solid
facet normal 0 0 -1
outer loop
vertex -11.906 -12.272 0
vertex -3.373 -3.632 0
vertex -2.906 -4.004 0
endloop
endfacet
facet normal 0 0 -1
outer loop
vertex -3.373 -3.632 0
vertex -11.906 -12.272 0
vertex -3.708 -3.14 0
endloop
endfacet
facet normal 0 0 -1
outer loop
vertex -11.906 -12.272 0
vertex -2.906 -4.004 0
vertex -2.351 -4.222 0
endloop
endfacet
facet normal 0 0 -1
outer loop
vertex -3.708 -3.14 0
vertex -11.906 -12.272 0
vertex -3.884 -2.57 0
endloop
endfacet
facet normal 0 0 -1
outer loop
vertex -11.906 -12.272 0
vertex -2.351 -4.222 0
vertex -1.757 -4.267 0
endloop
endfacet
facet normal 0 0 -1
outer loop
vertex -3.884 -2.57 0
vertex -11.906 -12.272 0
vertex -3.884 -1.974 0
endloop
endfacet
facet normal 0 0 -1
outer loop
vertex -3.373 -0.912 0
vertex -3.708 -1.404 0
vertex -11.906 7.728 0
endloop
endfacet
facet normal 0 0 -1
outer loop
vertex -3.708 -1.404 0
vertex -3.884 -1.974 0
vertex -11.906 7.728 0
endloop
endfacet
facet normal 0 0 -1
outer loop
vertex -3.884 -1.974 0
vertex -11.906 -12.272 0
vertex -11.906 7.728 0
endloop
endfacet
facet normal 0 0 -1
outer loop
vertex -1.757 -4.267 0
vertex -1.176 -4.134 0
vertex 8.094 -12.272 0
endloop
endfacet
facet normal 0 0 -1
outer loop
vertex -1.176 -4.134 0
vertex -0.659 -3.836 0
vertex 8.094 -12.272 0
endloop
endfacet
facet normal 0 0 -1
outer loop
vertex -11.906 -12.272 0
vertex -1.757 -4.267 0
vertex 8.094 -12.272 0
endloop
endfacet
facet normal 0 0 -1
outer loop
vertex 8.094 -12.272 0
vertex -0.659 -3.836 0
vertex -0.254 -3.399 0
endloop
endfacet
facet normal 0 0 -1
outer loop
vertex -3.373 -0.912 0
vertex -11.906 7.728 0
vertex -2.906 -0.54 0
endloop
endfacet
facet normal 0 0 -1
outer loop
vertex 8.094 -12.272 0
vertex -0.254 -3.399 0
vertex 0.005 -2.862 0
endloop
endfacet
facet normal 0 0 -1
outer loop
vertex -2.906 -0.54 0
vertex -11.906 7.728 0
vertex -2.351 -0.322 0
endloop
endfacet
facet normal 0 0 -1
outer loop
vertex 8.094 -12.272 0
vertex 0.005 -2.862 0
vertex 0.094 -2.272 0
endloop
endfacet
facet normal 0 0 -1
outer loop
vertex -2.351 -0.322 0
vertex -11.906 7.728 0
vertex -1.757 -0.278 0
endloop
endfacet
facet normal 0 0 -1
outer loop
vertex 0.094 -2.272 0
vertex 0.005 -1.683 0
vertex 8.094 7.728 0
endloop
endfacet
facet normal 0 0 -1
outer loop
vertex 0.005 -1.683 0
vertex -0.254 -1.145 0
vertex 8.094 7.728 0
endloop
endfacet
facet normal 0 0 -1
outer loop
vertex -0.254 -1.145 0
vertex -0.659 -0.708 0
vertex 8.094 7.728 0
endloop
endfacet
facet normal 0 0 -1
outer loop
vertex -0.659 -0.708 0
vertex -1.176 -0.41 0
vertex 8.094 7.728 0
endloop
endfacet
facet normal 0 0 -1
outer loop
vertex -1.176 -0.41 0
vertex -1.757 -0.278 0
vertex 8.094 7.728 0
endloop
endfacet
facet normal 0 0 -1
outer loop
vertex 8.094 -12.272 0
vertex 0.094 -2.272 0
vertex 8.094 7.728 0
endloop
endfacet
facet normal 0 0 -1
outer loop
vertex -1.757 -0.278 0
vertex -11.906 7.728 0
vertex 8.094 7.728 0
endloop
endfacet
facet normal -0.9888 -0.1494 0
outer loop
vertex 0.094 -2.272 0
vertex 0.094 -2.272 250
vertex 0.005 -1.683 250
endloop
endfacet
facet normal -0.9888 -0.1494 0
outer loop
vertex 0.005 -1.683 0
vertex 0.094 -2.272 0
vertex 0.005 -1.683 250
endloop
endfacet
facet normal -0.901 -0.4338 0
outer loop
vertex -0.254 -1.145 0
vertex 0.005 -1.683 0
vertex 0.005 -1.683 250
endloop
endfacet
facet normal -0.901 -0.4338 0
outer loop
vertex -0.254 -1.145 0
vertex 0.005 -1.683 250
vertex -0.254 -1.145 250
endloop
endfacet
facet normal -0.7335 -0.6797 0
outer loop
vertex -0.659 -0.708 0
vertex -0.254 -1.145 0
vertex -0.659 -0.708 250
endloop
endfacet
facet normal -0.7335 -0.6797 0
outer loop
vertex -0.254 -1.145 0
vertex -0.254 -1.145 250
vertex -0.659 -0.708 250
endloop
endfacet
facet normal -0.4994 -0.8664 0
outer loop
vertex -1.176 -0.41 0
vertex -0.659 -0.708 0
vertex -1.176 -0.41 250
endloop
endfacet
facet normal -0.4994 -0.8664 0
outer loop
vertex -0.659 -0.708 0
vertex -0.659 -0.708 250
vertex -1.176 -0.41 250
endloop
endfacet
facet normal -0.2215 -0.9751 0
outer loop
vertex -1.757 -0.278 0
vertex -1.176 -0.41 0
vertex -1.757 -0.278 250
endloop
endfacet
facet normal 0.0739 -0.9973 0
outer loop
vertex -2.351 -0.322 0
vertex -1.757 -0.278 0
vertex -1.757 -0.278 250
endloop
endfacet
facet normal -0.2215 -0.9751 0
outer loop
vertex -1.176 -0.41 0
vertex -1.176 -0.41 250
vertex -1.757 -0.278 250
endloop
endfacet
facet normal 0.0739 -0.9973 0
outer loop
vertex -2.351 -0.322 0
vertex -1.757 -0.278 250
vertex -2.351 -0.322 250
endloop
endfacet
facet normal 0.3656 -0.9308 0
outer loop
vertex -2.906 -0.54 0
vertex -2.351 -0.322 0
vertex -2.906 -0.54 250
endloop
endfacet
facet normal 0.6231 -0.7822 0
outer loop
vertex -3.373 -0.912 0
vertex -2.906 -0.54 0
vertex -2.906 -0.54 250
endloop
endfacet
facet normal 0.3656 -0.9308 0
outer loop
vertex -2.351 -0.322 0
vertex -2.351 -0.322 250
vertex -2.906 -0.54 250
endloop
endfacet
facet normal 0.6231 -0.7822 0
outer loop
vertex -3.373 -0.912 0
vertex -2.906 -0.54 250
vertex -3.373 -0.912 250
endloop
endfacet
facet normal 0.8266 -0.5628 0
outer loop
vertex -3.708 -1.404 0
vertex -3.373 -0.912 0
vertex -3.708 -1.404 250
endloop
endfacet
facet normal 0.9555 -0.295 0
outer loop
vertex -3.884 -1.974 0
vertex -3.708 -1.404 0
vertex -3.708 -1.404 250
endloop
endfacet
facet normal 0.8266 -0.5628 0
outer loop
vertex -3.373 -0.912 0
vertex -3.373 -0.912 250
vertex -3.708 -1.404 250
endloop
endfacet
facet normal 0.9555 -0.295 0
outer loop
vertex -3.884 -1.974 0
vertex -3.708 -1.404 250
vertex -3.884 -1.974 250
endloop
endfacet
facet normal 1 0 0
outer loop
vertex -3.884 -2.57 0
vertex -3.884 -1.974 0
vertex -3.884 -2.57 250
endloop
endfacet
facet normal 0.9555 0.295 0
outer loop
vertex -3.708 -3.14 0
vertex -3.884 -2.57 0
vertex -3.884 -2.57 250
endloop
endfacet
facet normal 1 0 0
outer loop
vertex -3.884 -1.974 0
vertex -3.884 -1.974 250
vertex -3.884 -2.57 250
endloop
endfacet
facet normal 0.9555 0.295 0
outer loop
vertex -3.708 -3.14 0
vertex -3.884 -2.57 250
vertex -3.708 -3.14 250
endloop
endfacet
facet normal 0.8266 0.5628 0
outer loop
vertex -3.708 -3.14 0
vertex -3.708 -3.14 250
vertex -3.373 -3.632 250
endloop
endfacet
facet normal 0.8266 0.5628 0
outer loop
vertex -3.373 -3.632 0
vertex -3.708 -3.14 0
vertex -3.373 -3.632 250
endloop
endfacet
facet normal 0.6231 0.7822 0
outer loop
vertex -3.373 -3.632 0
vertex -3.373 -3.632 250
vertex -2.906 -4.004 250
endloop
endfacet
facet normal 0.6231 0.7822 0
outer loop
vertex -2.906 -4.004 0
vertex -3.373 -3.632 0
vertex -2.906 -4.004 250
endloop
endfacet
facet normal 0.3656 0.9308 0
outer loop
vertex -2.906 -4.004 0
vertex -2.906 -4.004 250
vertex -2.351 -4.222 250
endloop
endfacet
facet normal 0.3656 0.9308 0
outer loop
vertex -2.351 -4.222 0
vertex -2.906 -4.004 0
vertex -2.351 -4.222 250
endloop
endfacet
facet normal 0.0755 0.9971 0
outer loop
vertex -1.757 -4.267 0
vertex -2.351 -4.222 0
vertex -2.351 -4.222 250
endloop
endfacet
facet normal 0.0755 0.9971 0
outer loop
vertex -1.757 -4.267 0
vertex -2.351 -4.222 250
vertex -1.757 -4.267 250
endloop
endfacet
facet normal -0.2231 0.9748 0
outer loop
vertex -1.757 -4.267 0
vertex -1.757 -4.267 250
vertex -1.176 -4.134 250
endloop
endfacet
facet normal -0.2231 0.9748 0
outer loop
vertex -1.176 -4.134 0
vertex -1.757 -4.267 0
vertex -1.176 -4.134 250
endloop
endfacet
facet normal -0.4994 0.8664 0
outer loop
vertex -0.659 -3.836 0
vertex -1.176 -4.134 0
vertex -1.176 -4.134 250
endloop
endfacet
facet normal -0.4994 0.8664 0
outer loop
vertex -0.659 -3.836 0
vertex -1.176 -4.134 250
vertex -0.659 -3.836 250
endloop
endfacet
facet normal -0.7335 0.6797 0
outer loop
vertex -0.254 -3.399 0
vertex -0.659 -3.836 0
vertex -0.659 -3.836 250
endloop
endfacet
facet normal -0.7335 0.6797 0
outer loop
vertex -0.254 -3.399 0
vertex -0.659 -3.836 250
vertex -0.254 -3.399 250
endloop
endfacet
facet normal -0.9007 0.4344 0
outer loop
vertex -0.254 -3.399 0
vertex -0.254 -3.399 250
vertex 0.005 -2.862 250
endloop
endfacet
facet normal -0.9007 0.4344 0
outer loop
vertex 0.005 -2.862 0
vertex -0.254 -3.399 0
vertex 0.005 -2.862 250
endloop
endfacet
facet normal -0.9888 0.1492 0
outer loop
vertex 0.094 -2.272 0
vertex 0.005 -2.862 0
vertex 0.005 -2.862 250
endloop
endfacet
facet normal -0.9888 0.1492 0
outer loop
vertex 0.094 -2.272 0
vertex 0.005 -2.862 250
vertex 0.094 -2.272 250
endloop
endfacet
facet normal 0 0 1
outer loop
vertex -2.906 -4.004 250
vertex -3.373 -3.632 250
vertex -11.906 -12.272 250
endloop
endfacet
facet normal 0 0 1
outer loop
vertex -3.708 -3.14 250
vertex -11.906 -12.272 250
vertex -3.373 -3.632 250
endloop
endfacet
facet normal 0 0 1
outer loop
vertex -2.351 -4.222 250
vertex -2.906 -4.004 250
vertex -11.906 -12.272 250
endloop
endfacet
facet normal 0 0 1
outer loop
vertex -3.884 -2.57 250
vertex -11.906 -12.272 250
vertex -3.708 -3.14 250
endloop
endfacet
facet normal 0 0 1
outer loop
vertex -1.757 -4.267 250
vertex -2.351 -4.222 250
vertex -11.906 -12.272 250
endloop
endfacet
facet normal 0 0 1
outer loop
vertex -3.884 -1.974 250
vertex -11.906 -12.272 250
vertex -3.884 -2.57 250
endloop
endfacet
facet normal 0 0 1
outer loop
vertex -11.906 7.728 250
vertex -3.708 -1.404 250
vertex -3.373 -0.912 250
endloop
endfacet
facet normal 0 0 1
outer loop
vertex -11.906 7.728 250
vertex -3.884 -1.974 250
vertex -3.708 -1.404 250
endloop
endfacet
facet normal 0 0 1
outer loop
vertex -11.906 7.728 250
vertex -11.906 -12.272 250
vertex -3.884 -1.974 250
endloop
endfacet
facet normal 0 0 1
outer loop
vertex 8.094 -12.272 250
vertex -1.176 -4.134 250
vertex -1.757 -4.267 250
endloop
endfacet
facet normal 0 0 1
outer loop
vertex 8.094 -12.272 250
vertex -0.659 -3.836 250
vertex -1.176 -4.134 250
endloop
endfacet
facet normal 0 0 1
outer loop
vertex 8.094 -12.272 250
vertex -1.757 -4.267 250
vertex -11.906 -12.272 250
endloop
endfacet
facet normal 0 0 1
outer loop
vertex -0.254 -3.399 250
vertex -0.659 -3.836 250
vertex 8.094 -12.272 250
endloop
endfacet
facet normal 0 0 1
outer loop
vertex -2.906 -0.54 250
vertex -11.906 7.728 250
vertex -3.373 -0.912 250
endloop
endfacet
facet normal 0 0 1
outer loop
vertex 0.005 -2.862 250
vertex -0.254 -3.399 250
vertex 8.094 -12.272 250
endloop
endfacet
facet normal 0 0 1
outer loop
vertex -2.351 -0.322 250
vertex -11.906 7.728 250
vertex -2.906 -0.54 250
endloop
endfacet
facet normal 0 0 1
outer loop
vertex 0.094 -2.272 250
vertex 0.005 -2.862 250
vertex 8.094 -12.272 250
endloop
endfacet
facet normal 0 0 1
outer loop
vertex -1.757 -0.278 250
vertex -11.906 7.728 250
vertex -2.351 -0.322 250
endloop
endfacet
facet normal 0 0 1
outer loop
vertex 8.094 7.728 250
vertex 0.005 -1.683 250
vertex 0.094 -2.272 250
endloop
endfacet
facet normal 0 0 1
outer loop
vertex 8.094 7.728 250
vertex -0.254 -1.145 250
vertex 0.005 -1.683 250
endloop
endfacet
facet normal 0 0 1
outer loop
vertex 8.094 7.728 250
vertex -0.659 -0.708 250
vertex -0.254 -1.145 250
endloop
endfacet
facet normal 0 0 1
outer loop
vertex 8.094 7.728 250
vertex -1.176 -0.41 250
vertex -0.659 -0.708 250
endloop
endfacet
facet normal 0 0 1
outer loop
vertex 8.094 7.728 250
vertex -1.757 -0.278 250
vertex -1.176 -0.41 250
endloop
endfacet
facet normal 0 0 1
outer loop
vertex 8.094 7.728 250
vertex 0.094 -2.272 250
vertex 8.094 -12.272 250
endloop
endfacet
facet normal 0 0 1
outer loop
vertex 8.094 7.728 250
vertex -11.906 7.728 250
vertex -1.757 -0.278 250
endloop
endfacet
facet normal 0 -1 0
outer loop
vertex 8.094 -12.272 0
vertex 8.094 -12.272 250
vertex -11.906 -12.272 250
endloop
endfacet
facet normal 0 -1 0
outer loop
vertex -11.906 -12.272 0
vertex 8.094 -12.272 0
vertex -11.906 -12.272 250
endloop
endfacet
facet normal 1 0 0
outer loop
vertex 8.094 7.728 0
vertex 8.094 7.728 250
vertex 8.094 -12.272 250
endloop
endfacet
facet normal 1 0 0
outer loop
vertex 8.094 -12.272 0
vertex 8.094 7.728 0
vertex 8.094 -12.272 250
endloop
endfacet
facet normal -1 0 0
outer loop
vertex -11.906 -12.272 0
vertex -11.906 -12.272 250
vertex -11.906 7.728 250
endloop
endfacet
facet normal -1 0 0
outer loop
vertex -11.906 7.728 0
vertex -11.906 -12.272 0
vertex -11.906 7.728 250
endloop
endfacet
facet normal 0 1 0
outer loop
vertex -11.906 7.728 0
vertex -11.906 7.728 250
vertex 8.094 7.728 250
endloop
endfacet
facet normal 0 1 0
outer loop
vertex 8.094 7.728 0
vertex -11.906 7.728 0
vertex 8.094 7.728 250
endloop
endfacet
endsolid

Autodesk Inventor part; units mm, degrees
ref_plane "YZ Plane" through (0, 0, 0) normal (1, 0, 0) x (0, 1, 0)
ref_plane "XZ Plane" through (0, 0, 0) normal (0, 1, 0) x (-1, 0, 0)
ref_plane "XY Plane" through (0, 0, 0) normal (0, 0, 1) x (1, 0, 0)
sketch "Sketch1" plane through (0, 0, 0) normal (0, 0, 1) x (1, 0, 0)
  line L0 (-11.9064, 7.7279) -> (8.0936, 7.7279)
  line L1 (8.0936, 7.7279) -> (8.0936, -12.2721)
  line L2 (8.0936, -12.2721) -> (-11.9064, -12.2721)
  line L3 (-11.9064, -12.2721) -> (-11.9064, 7.7279)
  point P0 (0, 0)
  dimension "d0" = 20
  dimension "d1" = 20
extrude "Extrusion1" add sketch "Sketch1" along normal blind 250
sketch "Sketch2" plane through (0, 0, 250) normal (0, 0, 1) x (1, 0, 0)
  circle A0 centre (-1.9064, -2.2721) radius 2
  line L0 (-11.9064, -12.2721) -> (8.0936, -12.2721) projected
  line L1 (8.0936, -12.2721) -> (8.0936, 7.7279) projected
  point P0 (0, 0)
  dimension "d4" = 4
  dimension "d5" = 10
  dimension "d6" = 10
extrude "Extrusion2" cut sketch "Sketch2" against normal blind 250
properties part number "2020x260mm" material "ABS Plastic"
